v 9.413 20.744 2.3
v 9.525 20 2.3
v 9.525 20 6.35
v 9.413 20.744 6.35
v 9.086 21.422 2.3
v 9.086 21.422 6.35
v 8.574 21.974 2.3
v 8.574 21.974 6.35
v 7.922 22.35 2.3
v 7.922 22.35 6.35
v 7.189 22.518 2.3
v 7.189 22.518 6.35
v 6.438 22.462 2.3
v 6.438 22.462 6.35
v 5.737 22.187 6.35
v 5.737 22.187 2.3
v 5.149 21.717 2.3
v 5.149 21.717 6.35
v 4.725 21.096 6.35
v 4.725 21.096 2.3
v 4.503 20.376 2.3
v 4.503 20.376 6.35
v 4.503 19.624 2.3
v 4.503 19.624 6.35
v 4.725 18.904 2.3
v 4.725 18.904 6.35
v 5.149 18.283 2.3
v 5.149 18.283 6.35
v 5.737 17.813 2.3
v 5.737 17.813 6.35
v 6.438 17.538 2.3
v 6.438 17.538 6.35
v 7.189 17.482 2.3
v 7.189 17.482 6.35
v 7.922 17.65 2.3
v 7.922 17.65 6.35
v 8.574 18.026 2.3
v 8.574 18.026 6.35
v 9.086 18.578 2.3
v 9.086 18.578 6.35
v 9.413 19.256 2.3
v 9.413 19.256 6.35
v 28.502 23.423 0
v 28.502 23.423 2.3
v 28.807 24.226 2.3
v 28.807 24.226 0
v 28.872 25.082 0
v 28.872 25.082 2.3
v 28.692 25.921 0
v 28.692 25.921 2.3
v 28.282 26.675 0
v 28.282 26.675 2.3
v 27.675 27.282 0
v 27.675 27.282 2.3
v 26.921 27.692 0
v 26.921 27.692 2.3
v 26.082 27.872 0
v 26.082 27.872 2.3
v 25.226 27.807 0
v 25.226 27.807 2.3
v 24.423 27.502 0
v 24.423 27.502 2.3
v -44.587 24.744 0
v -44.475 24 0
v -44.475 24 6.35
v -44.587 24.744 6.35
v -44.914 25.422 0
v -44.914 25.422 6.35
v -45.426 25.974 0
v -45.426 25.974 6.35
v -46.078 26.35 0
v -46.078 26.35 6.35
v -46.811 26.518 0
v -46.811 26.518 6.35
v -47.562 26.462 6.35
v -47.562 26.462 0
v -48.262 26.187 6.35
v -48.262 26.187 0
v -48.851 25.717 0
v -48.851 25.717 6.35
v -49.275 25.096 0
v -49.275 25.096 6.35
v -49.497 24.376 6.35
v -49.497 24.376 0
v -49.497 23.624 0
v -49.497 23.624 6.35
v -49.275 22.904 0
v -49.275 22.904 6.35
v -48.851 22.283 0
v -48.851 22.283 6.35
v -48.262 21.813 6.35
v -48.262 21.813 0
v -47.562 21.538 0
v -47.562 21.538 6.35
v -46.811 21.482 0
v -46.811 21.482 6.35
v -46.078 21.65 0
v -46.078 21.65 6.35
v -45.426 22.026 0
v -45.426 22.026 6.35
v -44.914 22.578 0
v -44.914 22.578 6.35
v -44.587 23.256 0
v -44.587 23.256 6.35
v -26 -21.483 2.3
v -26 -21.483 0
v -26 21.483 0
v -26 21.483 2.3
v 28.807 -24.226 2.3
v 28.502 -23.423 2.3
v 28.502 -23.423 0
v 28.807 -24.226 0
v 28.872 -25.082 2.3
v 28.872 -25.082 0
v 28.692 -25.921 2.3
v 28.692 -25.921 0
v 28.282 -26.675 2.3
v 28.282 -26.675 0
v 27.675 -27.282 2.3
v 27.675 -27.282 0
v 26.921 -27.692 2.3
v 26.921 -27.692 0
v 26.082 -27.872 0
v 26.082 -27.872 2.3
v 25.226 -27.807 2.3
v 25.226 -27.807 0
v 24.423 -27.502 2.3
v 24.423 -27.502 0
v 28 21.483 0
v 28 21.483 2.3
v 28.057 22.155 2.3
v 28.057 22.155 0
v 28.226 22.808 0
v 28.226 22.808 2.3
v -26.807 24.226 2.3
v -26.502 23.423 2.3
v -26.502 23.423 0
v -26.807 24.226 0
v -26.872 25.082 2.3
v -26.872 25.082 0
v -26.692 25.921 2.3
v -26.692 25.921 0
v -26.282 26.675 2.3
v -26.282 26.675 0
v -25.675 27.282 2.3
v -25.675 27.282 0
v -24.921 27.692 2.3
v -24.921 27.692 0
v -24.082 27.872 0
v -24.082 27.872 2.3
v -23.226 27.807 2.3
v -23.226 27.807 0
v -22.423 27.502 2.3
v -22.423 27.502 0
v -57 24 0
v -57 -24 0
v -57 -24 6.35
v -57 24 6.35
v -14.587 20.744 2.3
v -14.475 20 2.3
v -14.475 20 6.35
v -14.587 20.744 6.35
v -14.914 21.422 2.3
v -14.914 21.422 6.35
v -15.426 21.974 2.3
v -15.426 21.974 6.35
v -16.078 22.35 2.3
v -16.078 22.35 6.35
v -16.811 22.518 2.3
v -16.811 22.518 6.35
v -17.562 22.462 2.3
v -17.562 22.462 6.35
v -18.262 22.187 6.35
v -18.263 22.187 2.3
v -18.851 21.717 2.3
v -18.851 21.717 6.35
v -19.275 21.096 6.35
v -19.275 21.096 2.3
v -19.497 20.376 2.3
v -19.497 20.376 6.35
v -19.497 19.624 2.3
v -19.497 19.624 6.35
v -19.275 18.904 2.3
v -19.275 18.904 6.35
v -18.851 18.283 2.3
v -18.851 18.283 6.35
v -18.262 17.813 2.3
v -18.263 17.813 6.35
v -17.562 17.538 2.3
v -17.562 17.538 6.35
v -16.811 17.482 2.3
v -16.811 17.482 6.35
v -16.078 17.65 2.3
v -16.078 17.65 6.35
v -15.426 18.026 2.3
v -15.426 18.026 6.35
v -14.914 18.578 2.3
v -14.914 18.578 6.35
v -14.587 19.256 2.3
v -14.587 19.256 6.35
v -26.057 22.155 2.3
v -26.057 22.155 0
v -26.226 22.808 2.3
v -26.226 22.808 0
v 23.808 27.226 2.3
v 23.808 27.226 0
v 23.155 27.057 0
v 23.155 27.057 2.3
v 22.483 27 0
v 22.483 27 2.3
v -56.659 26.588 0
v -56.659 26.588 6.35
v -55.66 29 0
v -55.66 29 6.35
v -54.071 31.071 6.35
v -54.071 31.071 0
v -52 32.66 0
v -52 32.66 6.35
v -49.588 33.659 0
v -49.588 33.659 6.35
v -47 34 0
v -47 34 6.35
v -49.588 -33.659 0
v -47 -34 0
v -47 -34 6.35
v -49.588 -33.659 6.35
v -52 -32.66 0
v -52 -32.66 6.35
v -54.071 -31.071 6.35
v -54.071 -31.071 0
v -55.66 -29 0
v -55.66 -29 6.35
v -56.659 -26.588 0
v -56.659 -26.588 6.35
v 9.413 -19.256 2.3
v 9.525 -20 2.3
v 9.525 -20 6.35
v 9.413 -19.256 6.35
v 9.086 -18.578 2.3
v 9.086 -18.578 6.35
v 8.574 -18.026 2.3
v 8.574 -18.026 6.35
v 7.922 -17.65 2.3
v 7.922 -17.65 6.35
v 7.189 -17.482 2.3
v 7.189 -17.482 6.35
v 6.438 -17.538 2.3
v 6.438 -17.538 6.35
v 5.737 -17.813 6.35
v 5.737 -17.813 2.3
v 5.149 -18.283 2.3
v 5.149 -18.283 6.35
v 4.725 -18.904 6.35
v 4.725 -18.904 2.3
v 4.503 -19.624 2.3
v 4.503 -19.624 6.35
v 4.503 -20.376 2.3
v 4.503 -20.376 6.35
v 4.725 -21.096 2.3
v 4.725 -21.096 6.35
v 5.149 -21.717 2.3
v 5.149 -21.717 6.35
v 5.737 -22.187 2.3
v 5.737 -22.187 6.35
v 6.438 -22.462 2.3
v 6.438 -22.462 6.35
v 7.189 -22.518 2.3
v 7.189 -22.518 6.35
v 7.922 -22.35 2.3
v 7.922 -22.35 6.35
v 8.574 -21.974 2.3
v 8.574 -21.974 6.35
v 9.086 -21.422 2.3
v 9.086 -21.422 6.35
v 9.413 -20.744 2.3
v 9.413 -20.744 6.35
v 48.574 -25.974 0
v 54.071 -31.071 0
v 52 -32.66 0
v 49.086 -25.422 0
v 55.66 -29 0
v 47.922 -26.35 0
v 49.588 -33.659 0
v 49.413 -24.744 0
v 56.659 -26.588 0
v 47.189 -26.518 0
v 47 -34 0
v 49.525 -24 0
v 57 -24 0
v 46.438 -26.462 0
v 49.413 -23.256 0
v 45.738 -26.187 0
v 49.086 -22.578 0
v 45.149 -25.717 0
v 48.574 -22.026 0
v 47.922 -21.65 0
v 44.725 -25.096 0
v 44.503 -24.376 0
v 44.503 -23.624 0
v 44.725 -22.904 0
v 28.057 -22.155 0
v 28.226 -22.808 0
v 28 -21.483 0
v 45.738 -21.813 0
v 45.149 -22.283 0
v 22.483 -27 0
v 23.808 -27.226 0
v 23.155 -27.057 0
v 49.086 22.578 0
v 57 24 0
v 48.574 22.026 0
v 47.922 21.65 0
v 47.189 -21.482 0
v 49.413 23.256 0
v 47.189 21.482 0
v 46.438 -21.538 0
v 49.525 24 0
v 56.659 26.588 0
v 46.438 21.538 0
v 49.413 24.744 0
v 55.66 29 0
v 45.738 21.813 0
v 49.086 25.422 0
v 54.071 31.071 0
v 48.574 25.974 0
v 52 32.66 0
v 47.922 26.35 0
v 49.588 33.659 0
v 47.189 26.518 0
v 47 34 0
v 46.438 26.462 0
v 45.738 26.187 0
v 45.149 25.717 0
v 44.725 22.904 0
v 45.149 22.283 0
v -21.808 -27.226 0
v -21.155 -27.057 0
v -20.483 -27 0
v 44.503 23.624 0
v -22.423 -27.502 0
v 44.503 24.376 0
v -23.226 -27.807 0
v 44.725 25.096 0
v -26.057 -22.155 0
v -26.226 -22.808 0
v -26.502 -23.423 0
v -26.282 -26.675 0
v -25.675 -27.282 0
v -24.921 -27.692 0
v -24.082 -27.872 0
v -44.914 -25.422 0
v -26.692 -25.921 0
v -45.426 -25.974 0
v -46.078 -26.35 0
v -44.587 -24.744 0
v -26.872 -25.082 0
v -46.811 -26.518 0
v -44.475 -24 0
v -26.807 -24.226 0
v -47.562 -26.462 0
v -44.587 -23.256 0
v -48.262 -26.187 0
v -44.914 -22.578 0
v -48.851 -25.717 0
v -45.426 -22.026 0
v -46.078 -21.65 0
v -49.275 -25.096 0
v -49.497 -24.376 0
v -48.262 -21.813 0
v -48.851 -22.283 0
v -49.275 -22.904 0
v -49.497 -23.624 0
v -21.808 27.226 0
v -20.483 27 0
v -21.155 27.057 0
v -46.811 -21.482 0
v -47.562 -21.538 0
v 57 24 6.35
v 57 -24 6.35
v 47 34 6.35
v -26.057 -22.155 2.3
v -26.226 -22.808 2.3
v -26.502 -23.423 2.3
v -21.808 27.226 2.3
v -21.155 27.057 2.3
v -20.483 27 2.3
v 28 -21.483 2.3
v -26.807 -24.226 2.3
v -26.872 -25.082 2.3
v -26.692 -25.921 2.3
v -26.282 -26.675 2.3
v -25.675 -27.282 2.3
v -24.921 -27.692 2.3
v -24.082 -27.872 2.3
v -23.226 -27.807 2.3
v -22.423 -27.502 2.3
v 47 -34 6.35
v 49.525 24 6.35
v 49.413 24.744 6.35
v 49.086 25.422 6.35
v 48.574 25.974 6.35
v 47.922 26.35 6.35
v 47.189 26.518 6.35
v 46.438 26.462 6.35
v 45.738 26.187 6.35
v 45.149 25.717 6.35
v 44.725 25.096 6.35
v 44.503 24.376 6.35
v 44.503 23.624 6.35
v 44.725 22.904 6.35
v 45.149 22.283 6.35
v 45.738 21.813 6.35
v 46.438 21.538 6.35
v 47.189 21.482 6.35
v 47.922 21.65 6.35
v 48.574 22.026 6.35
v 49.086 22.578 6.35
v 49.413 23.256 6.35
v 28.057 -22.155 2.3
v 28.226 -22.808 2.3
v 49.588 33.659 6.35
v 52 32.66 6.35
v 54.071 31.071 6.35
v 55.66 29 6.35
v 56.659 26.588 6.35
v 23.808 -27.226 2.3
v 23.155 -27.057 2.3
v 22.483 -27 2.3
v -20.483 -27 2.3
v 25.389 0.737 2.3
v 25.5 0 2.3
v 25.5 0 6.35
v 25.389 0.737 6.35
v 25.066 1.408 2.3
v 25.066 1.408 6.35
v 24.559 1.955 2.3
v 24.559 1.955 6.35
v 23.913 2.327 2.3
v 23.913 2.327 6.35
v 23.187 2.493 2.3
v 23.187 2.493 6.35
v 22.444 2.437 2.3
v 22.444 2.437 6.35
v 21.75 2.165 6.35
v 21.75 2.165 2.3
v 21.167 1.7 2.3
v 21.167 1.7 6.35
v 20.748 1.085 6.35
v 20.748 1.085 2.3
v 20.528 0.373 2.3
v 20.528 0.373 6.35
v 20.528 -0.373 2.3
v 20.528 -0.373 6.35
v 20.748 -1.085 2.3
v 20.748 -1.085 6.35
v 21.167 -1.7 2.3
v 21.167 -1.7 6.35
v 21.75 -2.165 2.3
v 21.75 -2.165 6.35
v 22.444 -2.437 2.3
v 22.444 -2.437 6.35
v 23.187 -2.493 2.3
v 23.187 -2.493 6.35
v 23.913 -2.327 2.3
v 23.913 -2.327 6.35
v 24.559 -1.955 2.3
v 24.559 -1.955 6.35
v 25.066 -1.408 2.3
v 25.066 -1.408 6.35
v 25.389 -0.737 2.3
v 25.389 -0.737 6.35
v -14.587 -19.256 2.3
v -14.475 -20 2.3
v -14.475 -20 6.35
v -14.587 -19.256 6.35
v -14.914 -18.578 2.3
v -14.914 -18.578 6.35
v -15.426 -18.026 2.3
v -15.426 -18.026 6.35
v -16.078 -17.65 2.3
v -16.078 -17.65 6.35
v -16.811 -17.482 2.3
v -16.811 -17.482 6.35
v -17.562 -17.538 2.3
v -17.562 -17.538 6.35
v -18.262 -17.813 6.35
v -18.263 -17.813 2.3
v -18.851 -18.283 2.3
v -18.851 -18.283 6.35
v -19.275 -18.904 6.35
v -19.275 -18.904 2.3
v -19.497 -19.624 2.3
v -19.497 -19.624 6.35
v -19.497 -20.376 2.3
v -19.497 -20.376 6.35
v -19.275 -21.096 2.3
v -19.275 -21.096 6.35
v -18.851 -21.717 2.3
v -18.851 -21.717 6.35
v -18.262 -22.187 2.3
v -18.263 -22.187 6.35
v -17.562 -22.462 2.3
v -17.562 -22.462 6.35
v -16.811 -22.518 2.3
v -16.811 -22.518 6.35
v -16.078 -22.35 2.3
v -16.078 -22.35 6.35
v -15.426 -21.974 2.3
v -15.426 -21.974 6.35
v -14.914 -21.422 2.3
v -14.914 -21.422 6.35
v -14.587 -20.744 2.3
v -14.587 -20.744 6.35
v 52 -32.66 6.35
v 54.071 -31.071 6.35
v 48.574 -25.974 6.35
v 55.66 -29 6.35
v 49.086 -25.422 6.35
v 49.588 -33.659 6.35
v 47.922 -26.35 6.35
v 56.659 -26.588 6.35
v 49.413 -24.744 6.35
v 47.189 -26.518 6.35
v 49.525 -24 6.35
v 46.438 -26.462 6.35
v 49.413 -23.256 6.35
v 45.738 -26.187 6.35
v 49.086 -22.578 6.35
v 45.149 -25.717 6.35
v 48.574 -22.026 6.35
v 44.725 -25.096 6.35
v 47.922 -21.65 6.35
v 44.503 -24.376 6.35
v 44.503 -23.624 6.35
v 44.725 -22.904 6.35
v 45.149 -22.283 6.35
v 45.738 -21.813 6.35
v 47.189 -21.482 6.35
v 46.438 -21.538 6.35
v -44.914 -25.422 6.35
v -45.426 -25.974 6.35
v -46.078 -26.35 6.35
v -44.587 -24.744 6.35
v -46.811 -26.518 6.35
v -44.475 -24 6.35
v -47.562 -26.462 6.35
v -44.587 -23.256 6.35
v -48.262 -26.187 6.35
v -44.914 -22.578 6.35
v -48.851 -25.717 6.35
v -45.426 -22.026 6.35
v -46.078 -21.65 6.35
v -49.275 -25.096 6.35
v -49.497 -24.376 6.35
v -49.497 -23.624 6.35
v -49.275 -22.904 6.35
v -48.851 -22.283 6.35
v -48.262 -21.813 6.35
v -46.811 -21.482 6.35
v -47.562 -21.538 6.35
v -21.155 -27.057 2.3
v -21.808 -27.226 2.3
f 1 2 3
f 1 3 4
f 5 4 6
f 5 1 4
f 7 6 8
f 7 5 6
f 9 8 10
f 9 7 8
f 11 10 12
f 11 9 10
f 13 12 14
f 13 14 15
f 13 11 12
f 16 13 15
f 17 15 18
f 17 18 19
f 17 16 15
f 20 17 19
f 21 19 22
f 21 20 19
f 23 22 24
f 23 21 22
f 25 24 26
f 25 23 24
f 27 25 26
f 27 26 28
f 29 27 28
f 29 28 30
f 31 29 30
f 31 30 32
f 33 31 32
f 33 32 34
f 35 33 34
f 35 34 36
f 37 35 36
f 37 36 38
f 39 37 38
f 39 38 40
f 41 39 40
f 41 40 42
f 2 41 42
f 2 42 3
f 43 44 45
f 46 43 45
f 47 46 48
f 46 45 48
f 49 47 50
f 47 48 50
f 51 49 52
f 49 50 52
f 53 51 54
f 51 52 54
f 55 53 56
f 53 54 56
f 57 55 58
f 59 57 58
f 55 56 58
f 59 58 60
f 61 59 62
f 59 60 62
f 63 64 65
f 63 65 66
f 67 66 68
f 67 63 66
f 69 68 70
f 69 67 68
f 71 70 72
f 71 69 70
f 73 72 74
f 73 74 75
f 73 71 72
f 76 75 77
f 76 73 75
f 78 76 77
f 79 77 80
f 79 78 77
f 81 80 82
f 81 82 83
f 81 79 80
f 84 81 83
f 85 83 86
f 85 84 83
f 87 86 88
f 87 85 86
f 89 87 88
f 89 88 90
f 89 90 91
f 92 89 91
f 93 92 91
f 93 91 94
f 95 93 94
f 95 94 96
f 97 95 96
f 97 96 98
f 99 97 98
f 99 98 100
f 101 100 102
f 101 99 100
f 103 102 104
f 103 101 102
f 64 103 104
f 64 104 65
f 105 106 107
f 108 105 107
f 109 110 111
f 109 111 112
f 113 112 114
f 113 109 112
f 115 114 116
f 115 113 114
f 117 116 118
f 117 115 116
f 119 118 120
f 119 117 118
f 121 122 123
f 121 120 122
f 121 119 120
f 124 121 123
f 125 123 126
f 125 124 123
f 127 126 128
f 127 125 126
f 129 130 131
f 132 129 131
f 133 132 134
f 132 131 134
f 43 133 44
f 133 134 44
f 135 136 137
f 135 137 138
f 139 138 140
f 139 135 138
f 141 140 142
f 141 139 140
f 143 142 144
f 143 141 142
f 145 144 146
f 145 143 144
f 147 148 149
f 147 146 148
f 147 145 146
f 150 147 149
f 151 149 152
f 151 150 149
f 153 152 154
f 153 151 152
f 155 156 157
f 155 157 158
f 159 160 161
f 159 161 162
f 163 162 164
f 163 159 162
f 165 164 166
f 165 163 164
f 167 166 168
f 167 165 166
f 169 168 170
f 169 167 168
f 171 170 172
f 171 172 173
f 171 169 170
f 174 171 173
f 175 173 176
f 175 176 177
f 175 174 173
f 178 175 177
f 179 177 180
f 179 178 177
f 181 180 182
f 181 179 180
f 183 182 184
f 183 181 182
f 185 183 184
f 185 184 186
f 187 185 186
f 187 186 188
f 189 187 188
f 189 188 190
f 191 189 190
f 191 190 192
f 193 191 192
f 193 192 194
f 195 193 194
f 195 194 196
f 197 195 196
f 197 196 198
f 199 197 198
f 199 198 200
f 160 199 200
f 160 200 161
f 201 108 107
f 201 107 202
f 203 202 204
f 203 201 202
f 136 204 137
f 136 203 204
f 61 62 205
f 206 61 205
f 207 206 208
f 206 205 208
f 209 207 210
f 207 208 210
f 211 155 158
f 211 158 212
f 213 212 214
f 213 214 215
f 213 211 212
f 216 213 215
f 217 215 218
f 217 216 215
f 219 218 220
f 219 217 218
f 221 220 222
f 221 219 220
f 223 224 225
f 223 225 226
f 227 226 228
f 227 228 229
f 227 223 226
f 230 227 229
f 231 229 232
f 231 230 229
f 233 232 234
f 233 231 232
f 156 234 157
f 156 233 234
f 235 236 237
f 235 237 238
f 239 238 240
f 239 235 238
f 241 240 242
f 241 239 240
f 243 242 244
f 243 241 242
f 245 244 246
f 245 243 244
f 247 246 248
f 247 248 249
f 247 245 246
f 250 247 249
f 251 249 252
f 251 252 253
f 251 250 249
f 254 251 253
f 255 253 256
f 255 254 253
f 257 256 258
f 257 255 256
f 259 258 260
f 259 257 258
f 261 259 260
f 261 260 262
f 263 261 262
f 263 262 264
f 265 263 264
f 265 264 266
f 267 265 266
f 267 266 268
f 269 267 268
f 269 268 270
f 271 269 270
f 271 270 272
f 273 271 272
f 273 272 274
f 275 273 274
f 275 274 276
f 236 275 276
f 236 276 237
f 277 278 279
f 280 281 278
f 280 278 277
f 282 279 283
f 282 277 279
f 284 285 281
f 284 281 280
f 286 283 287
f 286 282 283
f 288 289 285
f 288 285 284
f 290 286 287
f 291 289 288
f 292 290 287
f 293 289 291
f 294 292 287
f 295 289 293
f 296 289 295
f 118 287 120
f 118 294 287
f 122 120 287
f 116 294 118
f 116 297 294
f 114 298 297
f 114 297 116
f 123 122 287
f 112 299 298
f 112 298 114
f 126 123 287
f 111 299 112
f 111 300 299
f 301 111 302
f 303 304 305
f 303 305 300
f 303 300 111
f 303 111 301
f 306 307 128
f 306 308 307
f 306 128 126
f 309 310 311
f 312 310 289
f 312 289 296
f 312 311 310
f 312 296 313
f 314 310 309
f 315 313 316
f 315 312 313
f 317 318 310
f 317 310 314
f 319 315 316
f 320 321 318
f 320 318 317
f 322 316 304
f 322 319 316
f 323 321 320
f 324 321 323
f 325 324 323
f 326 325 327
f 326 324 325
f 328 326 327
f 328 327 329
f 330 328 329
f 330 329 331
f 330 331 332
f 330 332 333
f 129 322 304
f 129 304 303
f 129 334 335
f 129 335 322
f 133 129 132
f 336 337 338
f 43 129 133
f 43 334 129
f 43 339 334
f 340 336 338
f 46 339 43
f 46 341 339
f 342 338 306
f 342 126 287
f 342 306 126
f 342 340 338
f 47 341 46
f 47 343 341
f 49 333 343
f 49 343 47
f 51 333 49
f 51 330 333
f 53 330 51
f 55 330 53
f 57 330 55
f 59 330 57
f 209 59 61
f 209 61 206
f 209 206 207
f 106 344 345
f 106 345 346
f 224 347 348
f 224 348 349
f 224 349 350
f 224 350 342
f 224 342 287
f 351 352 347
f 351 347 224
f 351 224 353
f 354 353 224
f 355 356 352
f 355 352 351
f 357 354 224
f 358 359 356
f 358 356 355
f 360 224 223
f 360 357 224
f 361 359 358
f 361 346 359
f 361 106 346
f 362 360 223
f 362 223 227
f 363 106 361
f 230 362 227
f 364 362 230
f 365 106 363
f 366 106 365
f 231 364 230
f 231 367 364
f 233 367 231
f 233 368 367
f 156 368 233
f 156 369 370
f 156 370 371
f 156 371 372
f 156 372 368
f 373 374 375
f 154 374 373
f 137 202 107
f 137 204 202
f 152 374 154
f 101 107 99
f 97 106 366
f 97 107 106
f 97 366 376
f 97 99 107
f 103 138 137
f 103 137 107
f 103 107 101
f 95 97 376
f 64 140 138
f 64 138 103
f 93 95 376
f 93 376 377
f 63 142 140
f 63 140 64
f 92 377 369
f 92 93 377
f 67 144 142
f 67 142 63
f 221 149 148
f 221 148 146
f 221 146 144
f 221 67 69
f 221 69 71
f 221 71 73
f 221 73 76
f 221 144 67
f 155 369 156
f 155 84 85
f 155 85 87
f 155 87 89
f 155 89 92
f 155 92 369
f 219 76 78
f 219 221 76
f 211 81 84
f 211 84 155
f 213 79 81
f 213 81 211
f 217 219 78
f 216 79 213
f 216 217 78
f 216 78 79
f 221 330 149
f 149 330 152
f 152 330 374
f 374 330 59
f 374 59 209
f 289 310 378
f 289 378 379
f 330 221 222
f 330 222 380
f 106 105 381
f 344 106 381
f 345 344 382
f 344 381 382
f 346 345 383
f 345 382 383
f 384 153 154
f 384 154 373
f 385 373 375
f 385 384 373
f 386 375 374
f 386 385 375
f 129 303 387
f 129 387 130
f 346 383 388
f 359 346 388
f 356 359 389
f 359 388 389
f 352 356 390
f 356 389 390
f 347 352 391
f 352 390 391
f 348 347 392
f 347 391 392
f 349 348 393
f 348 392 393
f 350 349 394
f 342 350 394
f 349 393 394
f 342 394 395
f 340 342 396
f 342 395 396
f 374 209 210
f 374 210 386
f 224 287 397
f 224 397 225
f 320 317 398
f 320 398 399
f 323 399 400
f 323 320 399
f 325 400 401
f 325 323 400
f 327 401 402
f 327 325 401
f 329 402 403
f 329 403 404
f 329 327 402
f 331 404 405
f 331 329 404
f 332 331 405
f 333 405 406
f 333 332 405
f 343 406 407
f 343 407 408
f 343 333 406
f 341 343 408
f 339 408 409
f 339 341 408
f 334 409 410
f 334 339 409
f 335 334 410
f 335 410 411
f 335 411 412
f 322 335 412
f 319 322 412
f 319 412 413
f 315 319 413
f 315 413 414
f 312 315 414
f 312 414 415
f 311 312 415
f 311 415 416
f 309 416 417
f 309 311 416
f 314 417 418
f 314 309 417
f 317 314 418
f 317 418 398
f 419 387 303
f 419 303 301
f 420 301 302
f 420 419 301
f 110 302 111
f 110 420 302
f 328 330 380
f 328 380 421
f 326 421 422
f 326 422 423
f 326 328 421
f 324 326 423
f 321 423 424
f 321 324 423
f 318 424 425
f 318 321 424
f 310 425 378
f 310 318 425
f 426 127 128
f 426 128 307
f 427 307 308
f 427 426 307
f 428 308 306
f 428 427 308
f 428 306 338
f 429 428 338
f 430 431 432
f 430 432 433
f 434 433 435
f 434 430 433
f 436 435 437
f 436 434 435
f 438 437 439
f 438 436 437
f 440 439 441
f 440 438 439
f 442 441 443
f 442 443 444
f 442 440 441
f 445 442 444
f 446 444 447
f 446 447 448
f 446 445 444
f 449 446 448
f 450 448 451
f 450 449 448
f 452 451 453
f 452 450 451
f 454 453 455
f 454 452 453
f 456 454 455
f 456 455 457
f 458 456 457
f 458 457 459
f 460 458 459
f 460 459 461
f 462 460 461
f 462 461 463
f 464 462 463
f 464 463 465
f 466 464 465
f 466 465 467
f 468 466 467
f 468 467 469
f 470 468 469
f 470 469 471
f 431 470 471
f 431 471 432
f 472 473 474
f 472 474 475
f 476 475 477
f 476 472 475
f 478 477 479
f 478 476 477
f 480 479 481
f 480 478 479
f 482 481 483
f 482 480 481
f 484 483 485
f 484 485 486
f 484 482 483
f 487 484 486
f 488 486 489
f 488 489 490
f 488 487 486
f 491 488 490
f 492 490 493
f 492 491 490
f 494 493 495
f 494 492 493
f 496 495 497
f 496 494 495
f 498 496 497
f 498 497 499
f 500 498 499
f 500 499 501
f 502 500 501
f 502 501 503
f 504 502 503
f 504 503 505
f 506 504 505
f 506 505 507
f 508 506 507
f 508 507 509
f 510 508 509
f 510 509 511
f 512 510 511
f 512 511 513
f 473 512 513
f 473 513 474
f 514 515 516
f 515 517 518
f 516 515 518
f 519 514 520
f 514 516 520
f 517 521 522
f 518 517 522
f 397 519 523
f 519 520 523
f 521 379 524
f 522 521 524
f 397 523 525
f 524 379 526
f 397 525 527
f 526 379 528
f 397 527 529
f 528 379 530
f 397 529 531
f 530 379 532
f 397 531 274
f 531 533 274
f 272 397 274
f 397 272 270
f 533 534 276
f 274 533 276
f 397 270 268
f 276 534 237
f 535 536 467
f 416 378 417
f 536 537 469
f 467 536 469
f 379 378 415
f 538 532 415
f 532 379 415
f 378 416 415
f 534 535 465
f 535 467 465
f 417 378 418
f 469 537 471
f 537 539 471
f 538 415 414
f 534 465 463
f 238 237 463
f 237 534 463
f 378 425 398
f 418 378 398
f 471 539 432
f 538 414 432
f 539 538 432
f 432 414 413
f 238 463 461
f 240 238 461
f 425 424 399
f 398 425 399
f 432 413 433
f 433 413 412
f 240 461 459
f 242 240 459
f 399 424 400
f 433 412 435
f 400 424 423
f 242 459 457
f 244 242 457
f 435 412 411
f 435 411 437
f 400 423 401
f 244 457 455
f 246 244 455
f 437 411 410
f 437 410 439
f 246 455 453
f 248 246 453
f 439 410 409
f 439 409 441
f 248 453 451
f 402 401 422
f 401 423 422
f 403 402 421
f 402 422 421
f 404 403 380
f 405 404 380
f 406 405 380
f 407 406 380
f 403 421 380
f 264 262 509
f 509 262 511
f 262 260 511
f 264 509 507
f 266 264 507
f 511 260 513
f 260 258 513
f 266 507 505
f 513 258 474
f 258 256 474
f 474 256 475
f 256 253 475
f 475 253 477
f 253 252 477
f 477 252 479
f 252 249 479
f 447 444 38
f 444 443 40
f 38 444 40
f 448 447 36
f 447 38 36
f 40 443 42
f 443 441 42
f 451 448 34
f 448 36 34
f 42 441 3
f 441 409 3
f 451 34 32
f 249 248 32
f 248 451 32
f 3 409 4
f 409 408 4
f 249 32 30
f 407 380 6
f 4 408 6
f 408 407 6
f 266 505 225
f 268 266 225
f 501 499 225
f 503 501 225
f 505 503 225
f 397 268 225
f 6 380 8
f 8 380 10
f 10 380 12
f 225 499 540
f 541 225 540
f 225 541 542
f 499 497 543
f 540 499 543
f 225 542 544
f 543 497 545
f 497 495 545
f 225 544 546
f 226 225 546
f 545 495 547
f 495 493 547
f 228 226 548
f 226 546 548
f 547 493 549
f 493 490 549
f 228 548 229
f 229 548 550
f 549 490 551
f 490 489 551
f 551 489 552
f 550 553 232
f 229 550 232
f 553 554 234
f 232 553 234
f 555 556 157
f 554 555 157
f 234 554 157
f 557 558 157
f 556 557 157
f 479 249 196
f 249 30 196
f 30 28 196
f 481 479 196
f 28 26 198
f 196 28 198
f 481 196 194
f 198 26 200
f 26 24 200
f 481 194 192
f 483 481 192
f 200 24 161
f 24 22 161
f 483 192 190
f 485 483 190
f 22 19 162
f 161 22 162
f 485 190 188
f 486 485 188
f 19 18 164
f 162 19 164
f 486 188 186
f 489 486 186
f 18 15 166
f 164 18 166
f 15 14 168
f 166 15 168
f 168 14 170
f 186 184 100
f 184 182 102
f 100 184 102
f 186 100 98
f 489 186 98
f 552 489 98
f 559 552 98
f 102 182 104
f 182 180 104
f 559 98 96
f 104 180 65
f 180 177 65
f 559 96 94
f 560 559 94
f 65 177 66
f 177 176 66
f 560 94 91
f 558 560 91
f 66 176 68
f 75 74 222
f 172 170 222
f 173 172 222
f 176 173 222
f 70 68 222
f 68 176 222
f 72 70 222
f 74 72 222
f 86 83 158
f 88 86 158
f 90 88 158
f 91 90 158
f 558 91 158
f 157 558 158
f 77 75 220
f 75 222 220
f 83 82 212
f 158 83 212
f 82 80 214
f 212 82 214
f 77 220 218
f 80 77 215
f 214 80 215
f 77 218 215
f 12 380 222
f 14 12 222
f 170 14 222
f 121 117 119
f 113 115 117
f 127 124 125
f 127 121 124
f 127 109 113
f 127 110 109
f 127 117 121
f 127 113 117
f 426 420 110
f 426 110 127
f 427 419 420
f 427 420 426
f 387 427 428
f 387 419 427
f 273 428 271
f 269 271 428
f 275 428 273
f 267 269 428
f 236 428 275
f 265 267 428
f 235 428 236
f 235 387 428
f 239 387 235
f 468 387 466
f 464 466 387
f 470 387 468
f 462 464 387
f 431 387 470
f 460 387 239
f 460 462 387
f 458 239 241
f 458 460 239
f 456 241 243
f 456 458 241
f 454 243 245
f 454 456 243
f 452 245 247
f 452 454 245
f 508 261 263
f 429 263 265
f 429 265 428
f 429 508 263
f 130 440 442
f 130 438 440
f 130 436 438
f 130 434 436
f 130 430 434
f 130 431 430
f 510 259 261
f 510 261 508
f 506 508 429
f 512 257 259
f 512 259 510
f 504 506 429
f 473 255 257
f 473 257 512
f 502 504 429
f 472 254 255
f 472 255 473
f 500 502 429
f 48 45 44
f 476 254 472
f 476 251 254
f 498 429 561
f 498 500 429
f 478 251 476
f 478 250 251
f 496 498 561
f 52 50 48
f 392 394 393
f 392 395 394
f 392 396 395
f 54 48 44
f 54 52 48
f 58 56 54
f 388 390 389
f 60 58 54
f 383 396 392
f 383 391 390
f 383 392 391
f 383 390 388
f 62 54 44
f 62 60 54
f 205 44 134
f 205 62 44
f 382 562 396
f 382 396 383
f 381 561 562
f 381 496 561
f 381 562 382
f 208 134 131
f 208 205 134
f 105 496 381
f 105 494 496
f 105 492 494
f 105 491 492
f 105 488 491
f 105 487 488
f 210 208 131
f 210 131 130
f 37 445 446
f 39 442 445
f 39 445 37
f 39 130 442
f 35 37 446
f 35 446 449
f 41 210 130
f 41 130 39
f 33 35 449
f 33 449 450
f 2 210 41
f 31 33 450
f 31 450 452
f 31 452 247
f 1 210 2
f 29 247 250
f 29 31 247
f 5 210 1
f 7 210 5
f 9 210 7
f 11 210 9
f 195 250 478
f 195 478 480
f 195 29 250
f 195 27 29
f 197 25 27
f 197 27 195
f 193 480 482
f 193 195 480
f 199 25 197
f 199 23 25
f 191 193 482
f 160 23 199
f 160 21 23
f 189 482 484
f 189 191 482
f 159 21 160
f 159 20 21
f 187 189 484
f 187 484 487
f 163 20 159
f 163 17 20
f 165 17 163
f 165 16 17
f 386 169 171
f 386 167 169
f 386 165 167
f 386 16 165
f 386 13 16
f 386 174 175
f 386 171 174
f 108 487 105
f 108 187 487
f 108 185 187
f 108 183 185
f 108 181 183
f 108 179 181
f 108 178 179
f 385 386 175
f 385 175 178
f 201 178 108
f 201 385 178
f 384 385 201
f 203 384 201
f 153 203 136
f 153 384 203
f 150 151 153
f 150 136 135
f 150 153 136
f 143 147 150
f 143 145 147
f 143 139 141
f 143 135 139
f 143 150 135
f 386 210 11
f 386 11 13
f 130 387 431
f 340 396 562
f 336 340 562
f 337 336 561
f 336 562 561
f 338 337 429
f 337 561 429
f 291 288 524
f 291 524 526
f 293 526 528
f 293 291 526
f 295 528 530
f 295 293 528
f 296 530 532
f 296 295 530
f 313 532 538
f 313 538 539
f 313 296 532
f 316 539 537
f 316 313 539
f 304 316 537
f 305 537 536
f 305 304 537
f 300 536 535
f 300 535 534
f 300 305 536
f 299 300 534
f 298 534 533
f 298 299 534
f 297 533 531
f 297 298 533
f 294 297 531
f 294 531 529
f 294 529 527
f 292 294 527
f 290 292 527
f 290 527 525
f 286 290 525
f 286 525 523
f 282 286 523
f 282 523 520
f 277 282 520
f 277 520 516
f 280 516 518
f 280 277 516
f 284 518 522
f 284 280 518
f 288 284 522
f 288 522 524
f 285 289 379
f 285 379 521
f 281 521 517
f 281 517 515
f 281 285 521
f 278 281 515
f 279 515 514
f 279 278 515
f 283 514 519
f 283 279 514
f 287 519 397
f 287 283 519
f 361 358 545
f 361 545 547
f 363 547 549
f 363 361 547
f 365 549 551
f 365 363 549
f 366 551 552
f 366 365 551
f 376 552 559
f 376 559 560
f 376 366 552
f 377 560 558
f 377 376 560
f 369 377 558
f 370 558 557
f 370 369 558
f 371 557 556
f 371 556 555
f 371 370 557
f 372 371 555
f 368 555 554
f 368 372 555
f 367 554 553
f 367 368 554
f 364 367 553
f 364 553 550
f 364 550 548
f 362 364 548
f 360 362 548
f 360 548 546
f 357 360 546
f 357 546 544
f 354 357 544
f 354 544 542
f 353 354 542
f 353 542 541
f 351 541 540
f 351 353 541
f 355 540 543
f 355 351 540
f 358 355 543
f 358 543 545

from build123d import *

# Parameters (mm, degrees)
SKETCH1_R           = 2.525
SKETCH1_R_2         = 2.5
BOSS_EXTRUDE1_DEPTH = 6.35
SKETCH2_W           = 54
SKETCH2_H           = 54
CUT_EXTRUDE1_DEPTH  = 2.3
CUT_EXTRUDE2_DEPTH  = 2.3


with BuildPart() as part:
    # Sketch1 → Boss-Extrude1 (new body)
    with BuildSketch(Plane.XY):
        with BuildLine():
            Line((-47, 34), (47, 34))
            ThreePointArc((47, 34), (54.071067812, 31.071067812), (57, 24))
            Line((57, 24), (57, -24))
            ThreePointArc((57, -24), (54.071067812, -31.071067812), (47, -34))
            Line((47, -34), (-47, -34))
            ThreePointArc((-47, -34), (-54.071067812, -31.071067812), (-57, -24))
            Line((-57, -24), (-57, 24))
            ThreePointArc((-57, 24), (-54.071067812, 31.071067812), (-47, 34))
        make_face()
        with Locations((-47, -24)):
            Circle(SKETCH1_R, mode=Mode.SUBTRACT)
        with Locations((47, -24)):
            Circle(SKETCH1_R, mode=Mode.SUBTRACT)
        with Locations((47, 24)):
            Circle(SKETCH1_R, mode=Mode.SUBTRACT)
        with Locations((-47, 24)):
            Circle(SKETCH1_R, mode=Mode.SUBTRACT)
        with Locations((-17, 20)):
            Circle(SKETCH1_R, mode=Mode.SUBTRACT)
        with Locations((-17, -20)):
            Circle(SKETCH1_R, mode=Mode.SUBTRACT)
        with Locations((7, 20)):
            Circle(SKETCH1_R, mode=Mode.SUBTRACT)
        with Locations((7, -20)):
            Circle(SKETCH1_R, mode=Mode.SUBTRACT)
        with Locations((23, 0)):
            Circle(SKETCH1_R_2, mode=Mode.SUBTRACT)
    extrude(amount=BOSS_EXTRUDE1_DEPTH)

    # Sketch2 → Cut-Extrude1 (cut)
    with BuildSketch(Plane(origin=(0, 0, 0), x_dir=(-1, 0, 0), z_dir=(0, 0, -1))):
        with Locations((-1, 0)):
            Rectangle(SKETCH2_W, SKETCH2_H)
    extrude(amount=-CUT_EXTRUDE1_DEPTH, mode=Mode.SUBTRACT)

    # Sketch3 → Cut-Extrude2 (cut)
    with BuildSketch(Plane(origin=(0, 0, 2.3), x_dir=(-1, 0, 0), z_dir=(0, 0, -1))):
        with BuildLine():
            Line((-22.483177153, 27), (-22.483177153, 21.483177153))
            Line((-22.483177153, 21.483177153), (-28, 21.483177153))
            ThreePointArc((-28, 21.483177153), (-28.127559597, 22.485277608), (-28.502102661, 23.423464298))
            ThreePointArc((-28.502102661, 23.423464298), (-28, 27), (-24.423464298, 27.502102661))
            ThreePointArc((-24.423464298, 27.502102661), (-23.485277608, 27.127559597), (-22.483177153, 27))
        make_face()
        with BuildLine():
            Line((20.483177153, 21.483177153), (26, 21.483177153))
            ThreePointArc((26, 21.483177153), (26.127559597, 22.485277608), (26.502102661, 23.423464298))
            ThreePointArc((26.502102661, 23.423464298), (26, 27), (22.423464298, 27.502102661))
            ThreePointArc((22.423464298, 27.502102661), (21.485277608, 27.127559597), (20.483177153, 27))
            Line((20.483177153, 27), (20.483177153, 21.483177153))
        make_face()
        with BuildLine():
            Line((20.483177153, -27), (20.483177153, -21.483177153))
            Line((20.483177153, -21.483177153), (26, -21.483177153))
            ThreePointArc((26, -21.483177153), (26.127559597, -22.485277608), (26.502102661, -23.423464298))
            ThreePointArc((26.502102661, -23.423464298), (26, -27), (22.423464298, -27.502102661))
            ThreePointArc((22.423464298, -27.502102661), (21.485277608, -27.127559597), (20.483177153, -27))
        make_face()
        with BuildLine():
            Line((-22.483177153, -21.483177153), (-28, -21.483177153))
            ThreePointArc((-28, -21.483177153), (-28.127559597, -22.485277608), (-28.502102661, -23.423464298))
            ThreePointArc((-28.502102661, -23.423464298), (-28, -27), (-24.423464298, -27.502102661))
            ThreePointArc((-24.423464298, -27.502102661), (-23.485277608, -27.127559597), (-22.483177153, -27))
            Line((-22.483177153, -27), (-22.483177153, -21.483177153))
        make_face()
    extrude(amount=CUT_EXTRUDE2_DEPTH, mode=Mode.SUBTRACT)


solid = part.part
